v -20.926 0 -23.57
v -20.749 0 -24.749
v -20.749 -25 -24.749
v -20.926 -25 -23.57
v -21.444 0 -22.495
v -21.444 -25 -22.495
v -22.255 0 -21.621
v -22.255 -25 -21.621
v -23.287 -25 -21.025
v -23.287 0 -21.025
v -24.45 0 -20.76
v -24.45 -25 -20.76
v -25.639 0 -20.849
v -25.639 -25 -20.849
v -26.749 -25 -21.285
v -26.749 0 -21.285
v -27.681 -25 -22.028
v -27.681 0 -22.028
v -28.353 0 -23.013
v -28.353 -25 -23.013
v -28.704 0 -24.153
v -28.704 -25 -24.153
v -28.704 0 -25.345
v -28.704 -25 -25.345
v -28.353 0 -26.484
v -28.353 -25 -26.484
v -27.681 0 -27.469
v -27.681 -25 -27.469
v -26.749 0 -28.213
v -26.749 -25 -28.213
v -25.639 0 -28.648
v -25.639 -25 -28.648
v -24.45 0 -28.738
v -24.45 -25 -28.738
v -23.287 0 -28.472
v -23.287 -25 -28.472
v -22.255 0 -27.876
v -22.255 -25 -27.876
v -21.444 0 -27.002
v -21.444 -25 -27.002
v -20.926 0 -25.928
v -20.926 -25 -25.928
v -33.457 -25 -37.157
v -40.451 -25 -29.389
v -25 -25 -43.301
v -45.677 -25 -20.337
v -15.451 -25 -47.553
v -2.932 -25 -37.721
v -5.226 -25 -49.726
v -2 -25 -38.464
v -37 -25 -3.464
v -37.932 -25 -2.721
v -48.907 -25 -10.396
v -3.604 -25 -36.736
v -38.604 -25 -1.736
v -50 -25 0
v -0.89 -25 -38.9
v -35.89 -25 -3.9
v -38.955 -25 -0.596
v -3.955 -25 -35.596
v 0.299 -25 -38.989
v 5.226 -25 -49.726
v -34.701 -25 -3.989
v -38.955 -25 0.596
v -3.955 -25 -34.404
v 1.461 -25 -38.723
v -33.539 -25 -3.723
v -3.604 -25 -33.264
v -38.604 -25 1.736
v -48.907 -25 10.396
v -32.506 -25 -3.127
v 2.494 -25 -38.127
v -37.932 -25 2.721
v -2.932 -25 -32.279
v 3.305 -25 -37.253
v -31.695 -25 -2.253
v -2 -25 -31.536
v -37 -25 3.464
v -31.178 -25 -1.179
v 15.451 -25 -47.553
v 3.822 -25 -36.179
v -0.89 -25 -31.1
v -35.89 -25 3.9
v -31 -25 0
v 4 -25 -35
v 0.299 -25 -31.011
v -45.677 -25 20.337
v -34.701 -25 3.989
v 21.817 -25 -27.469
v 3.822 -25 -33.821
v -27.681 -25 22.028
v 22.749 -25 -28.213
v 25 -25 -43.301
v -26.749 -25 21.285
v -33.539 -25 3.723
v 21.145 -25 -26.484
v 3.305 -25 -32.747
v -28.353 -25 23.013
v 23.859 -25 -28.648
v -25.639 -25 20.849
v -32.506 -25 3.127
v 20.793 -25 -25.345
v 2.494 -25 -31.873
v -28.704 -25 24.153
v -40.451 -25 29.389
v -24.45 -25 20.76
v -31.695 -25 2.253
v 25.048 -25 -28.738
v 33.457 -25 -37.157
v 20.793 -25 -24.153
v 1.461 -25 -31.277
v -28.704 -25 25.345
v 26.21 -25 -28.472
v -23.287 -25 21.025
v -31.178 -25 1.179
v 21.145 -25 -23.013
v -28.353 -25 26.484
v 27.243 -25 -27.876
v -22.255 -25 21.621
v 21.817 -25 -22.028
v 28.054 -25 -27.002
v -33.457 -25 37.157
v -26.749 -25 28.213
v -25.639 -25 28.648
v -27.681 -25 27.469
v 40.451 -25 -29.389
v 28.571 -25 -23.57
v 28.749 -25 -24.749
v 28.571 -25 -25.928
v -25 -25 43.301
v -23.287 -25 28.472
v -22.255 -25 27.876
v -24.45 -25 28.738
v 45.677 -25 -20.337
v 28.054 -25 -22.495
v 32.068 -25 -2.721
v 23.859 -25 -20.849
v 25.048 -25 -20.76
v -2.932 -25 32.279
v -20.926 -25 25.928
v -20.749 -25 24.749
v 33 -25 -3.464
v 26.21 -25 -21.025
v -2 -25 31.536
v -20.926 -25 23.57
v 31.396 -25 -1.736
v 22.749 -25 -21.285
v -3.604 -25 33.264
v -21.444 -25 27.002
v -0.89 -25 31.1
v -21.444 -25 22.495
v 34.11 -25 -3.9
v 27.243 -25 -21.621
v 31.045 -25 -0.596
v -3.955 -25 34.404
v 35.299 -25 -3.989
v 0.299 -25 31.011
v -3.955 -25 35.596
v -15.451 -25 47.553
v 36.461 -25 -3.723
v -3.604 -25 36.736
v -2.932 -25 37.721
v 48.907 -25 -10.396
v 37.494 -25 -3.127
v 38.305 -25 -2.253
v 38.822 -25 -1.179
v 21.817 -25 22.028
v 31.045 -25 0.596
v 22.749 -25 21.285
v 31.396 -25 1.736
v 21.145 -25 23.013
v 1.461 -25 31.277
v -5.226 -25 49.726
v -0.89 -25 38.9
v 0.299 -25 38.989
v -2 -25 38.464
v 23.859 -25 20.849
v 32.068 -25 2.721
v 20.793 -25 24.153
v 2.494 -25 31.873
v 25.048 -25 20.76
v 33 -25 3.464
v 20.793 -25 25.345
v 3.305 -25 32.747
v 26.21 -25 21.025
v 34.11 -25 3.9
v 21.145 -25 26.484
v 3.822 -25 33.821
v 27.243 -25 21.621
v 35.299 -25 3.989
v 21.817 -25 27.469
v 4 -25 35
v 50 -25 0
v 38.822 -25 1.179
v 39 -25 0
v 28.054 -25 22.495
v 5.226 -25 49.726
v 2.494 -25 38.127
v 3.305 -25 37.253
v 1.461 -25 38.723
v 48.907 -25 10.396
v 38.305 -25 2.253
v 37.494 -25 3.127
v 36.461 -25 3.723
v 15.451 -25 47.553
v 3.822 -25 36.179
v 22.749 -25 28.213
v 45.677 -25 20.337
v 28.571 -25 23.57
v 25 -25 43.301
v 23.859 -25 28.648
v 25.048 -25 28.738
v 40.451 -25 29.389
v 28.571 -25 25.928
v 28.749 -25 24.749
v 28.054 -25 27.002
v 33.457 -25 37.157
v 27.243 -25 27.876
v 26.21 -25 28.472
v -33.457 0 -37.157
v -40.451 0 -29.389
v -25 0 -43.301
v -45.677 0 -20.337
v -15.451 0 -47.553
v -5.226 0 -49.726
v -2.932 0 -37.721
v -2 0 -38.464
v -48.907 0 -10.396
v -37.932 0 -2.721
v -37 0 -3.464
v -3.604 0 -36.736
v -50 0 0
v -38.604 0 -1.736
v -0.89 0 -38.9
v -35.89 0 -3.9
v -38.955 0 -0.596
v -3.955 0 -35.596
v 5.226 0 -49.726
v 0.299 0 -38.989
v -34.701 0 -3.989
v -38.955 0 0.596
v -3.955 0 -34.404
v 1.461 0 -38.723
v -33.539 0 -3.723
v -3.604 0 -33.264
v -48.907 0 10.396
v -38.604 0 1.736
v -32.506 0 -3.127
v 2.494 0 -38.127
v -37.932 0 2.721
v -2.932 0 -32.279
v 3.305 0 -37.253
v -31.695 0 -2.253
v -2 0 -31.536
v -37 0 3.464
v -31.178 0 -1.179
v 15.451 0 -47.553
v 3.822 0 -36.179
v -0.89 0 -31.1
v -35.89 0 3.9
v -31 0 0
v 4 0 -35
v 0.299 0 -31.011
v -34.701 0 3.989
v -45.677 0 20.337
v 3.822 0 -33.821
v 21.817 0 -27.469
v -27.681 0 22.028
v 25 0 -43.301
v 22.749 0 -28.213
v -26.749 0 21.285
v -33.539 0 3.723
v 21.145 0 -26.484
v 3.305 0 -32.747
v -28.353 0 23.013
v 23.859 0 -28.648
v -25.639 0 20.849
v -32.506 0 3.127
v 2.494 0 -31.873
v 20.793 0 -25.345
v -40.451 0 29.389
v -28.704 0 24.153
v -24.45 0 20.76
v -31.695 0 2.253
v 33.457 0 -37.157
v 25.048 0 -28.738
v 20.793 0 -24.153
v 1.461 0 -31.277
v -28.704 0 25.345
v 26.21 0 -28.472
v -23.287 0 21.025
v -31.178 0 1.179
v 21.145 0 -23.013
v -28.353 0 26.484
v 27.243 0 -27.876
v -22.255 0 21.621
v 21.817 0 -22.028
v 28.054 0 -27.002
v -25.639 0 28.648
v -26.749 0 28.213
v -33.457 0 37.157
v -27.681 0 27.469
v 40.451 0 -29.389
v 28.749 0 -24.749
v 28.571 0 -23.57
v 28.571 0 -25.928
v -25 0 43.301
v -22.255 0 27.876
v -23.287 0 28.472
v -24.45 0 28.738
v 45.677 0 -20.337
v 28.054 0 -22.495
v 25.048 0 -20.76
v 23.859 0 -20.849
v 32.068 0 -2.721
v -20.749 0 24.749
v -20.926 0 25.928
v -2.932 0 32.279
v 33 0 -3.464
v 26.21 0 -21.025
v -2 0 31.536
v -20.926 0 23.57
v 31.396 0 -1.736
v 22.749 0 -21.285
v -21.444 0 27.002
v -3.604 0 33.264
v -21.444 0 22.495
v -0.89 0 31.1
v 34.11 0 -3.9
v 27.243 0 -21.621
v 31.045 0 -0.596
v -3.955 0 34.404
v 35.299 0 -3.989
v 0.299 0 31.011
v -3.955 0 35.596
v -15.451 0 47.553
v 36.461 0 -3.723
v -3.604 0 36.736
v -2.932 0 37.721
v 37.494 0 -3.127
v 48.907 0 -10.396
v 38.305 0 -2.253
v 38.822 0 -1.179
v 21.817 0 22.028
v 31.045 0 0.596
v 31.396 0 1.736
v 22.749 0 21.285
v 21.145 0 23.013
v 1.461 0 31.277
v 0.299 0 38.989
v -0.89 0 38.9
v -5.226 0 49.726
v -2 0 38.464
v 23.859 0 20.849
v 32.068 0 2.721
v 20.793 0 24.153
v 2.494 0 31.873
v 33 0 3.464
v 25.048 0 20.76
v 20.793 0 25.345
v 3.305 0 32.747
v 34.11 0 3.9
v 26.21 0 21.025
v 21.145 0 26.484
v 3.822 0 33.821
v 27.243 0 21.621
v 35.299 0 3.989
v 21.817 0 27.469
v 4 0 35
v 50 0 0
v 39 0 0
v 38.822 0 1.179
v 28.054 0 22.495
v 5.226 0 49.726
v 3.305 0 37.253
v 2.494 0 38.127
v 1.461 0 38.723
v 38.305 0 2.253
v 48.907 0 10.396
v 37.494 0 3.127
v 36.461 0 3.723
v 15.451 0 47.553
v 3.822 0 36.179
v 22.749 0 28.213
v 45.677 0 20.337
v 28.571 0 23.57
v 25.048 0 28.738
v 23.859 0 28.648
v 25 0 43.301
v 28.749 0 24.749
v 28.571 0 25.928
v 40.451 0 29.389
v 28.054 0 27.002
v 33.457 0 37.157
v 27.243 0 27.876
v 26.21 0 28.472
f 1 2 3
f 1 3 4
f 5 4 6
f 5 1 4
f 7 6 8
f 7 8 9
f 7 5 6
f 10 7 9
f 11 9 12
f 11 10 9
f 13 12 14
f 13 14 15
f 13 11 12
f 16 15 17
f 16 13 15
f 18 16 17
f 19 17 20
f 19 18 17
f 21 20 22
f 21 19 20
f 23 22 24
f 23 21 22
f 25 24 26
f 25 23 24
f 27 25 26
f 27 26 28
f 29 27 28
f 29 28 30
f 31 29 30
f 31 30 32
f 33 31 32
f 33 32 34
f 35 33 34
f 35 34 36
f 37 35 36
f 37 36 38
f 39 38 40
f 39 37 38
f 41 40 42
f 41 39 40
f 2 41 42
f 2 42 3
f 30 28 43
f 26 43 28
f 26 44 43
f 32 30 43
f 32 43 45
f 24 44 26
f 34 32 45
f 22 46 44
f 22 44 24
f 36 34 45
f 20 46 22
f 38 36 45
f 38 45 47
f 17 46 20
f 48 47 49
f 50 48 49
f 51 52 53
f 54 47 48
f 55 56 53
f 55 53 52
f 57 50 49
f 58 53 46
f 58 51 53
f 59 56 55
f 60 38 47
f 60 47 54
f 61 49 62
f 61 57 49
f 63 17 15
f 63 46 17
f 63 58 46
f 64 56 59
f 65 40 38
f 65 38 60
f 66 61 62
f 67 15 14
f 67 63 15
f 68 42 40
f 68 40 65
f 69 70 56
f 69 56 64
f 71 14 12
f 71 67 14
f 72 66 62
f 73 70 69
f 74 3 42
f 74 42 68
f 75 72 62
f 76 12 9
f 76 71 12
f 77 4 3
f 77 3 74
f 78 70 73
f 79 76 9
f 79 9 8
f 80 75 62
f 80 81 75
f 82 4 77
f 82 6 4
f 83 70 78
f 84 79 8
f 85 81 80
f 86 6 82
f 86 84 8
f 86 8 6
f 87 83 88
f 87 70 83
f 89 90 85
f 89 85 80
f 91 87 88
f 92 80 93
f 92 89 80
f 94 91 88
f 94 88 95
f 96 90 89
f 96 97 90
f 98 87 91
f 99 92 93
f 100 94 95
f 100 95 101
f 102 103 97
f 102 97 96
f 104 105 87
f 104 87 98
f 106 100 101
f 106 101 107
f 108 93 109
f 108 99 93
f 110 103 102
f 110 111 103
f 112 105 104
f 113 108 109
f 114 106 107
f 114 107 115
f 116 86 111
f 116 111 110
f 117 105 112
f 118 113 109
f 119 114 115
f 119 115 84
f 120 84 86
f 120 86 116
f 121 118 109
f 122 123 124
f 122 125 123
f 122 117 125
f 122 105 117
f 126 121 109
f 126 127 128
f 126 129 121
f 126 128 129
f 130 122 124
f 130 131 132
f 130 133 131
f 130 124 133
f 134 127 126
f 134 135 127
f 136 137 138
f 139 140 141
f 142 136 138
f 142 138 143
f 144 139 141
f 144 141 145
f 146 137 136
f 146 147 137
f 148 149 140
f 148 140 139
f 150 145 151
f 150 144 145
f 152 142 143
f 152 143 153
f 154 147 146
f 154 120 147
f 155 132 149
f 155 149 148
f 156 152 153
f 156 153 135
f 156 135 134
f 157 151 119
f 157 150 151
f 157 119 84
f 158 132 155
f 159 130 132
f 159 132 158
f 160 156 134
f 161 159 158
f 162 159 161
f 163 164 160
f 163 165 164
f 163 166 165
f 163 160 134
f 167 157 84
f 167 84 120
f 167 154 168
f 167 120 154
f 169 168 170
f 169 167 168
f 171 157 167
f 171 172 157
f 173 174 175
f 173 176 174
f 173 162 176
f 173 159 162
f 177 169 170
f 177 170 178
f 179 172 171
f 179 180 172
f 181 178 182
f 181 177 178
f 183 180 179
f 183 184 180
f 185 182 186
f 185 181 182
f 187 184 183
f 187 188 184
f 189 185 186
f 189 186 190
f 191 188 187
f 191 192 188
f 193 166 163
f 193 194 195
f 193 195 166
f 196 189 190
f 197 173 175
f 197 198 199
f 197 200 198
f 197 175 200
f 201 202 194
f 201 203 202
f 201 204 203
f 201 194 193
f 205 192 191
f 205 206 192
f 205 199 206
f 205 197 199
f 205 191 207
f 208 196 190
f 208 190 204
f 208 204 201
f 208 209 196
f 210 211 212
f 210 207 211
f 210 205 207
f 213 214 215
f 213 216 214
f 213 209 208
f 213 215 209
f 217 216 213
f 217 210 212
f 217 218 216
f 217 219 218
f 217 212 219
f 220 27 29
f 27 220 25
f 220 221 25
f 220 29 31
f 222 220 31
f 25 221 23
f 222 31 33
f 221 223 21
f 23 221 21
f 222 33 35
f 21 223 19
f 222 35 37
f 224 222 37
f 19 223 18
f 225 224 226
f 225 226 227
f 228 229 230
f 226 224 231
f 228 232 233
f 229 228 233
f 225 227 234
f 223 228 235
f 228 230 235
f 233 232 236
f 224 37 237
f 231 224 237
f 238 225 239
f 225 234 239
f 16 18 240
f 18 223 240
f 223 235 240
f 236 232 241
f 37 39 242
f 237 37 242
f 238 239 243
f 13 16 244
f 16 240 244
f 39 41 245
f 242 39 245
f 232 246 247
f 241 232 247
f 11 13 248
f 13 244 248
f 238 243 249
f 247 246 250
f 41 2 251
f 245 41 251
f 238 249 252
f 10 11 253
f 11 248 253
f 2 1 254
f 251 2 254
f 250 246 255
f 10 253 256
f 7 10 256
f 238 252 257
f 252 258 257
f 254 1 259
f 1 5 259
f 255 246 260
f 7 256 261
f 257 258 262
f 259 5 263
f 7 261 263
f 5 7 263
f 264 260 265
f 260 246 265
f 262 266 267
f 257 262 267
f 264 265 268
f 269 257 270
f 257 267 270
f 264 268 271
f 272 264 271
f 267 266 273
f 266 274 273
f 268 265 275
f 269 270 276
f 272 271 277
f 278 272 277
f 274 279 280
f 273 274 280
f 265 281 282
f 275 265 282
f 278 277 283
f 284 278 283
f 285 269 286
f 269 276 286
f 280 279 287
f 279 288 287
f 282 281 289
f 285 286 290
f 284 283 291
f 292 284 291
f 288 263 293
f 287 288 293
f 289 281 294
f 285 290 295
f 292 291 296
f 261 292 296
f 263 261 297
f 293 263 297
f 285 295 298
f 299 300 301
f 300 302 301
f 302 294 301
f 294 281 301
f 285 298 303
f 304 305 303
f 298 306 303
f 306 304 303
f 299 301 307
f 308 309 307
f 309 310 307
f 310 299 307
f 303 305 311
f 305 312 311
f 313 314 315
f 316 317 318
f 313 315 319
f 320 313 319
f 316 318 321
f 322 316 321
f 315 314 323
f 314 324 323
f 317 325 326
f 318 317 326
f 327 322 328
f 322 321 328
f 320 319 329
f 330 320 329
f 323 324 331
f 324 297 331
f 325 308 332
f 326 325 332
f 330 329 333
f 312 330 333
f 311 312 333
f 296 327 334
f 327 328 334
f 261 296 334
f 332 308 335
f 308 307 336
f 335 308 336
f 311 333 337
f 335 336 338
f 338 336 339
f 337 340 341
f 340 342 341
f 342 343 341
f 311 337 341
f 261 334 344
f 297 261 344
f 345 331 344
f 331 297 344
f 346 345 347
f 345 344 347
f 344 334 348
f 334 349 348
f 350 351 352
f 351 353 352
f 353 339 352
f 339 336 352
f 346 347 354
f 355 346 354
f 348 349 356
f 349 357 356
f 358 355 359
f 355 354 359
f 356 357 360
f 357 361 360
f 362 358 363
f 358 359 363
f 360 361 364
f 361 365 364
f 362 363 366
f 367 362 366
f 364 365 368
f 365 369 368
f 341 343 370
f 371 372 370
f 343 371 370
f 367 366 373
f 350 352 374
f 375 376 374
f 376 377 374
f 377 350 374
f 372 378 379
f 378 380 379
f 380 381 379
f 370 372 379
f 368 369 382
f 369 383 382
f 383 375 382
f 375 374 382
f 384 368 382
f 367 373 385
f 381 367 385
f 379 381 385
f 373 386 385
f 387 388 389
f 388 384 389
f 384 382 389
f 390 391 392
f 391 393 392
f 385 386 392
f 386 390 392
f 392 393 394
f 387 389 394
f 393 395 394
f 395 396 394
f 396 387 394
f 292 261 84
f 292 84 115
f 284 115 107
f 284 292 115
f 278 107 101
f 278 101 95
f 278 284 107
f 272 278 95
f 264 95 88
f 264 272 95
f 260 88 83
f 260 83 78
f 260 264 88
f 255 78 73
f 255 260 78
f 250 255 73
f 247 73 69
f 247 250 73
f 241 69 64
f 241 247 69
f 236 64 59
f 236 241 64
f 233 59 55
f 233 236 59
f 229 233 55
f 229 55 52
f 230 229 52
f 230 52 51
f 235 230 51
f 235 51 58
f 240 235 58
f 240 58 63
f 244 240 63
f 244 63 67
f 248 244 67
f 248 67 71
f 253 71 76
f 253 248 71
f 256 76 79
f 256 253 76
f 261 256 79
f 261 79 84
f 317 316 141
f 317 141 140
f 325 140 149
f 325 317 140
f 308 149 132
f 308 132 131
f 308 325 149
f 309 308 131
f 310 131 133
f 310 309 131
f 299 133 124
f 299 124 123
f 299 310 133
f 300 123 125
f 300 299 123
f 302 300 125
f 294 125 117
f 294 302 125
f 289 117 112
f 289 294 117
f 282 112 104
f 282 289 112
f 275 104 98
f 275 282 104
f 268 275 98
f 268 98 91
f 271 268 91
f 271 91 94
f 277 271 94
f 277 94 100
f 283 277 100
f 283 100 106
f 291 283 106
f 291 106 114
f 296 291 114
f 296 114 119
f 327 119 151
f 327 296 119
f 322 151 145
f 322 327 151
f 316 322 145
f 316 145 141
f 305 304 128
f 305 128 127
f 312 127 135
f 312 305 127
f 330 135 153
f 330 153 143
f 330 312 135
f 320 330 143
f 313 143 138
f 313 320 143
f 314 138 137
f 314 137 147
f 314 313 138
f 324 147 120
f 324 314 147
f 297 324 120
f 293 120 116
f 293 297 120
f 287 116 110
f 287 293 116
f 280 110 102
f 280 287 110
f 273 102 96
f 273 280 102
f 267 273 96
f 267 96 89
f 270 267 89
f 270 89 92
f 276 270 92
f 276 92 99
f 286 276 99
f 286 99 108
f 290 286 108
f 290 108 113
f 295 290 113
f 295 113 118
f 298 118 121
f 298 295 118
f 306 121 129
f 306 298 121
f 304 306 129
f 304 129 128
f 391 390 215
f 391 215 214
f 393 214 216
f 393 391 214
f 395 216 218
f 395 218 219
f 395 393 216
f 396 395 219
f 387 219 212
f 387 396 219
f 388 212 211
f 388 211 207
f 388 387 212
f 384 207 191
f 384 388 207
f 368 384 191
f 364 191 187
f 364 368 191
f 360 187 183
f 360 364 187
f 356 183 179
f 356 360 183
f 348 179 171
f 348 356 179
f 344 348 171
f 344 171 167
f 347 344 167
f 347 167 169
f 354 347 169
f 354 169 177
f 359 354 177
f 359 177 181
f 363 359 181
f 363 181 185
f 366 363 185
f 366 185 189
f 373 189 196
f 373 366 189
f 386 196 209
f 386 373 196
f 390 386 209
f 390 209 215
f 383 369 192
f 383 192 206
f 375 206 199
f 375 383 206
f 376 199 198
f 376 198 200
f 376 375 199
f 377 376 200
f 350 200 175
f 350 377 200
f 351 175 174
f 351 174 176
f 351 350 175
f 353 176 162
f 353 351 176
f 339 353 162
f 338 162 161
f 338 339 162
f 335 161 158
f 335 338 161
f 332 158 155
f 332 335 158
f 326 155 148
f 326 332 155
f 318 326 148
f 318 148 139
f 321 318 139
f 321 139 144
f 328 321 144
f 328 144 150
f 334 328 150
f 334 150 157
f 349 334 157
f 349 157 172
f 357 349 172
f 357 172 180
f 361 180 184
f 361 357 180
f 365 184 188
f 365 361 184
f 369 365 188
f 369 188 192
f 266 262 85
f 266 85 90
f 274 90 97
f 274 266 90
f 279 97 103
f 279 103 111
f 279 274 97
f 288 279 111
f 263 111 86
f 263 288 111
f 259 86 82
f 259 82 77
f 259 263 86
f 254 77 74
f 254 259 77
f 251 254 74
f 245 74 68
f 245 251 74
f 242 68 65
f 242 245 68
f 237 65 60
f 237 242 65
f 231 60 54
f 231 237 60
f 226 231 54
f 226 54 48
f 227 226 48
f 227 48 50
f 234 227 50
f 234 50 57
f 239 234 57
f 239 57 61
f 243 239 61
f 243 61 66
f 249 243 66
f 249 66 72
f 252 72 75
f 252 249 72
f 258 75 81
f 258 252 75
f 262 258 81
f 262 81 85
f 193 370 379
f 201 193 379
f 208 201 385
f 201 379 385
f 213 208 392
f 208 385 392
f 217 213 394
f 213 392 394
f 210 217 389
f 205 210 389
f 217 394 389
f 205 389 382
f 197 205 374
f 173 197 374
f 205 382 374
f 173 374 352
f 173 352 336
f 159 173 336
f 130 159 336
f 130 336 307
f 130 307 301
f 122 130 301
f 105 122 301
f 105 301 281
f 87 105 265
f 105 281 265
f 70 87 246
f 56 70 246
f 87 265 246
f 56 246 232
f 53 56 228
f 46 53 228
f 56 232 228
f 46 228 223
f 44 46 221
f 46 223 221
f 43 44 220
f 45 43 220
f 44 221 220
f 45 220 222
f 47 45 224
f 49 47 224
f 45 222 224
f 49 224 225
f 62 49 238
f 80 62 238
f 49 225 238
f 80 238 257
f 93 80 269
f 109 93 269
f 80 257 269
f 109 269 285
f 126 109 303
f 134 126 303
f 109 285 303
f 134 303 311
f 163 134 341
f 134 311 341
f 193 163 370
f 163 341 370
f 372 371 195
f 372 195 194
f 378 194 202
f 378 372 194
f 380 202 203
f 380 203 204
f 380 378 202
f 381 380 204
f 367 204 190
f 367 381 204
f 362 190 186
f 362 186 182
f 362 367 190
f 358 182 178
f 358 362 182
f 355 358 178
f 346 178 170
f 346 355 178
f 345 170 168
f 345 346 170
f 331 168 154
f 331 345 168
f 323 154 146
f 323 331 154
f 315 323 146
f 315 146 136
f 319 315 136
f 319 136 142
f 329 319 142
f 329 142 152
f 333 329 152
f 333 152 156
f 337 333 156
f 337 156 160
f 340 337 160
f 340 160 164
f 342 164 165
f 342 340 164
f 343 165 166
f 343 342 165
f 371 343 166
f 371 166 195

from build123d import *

# Parameters (mm, degrees)
F0_R     = 50
F0_R_2   = 4
F1_DEPTH = 25


with BuildPart() as f1:
    # F0 (on Front) → F1 (new body)
    with BuildSketch(Plane.XZ):
        Circle(F0_R)
        with Locations((-24.748737, -24.748737)):
            Circle(F0_R_2, mode=Mode.SUBTRACT)
        with Locations((0, -35)):
            Circle(F0_R_2, mode=Mode.SUBTRACT)
        with Locations((24.748737, -24.748737)):
            Circle(F0_R_2, mode=Mode.SUBTRACT)
        with Locations((-35, 0)):
            Circle(F0_R_2, mode=Mode.SUBTRACT)
        with Locations((-24.748737, 24.748737)):
            Circle(F0_R_2, mode=Mode.SUBTRACT)
        with Locations((24.748737, 24.748737)):
            Circle(F0_R_2, mode=Mode.SUBTRACT)
        with Locations((35, 0)):
            Circle(F0_R_2, mode=Mode.SUBTRACT)
        with Locations((0, 35)):
            Circle(F0_R_2, mode=Mode.SUBTRACT)
    extrude(amount=F1_DEPTH)


solid = f1.part
